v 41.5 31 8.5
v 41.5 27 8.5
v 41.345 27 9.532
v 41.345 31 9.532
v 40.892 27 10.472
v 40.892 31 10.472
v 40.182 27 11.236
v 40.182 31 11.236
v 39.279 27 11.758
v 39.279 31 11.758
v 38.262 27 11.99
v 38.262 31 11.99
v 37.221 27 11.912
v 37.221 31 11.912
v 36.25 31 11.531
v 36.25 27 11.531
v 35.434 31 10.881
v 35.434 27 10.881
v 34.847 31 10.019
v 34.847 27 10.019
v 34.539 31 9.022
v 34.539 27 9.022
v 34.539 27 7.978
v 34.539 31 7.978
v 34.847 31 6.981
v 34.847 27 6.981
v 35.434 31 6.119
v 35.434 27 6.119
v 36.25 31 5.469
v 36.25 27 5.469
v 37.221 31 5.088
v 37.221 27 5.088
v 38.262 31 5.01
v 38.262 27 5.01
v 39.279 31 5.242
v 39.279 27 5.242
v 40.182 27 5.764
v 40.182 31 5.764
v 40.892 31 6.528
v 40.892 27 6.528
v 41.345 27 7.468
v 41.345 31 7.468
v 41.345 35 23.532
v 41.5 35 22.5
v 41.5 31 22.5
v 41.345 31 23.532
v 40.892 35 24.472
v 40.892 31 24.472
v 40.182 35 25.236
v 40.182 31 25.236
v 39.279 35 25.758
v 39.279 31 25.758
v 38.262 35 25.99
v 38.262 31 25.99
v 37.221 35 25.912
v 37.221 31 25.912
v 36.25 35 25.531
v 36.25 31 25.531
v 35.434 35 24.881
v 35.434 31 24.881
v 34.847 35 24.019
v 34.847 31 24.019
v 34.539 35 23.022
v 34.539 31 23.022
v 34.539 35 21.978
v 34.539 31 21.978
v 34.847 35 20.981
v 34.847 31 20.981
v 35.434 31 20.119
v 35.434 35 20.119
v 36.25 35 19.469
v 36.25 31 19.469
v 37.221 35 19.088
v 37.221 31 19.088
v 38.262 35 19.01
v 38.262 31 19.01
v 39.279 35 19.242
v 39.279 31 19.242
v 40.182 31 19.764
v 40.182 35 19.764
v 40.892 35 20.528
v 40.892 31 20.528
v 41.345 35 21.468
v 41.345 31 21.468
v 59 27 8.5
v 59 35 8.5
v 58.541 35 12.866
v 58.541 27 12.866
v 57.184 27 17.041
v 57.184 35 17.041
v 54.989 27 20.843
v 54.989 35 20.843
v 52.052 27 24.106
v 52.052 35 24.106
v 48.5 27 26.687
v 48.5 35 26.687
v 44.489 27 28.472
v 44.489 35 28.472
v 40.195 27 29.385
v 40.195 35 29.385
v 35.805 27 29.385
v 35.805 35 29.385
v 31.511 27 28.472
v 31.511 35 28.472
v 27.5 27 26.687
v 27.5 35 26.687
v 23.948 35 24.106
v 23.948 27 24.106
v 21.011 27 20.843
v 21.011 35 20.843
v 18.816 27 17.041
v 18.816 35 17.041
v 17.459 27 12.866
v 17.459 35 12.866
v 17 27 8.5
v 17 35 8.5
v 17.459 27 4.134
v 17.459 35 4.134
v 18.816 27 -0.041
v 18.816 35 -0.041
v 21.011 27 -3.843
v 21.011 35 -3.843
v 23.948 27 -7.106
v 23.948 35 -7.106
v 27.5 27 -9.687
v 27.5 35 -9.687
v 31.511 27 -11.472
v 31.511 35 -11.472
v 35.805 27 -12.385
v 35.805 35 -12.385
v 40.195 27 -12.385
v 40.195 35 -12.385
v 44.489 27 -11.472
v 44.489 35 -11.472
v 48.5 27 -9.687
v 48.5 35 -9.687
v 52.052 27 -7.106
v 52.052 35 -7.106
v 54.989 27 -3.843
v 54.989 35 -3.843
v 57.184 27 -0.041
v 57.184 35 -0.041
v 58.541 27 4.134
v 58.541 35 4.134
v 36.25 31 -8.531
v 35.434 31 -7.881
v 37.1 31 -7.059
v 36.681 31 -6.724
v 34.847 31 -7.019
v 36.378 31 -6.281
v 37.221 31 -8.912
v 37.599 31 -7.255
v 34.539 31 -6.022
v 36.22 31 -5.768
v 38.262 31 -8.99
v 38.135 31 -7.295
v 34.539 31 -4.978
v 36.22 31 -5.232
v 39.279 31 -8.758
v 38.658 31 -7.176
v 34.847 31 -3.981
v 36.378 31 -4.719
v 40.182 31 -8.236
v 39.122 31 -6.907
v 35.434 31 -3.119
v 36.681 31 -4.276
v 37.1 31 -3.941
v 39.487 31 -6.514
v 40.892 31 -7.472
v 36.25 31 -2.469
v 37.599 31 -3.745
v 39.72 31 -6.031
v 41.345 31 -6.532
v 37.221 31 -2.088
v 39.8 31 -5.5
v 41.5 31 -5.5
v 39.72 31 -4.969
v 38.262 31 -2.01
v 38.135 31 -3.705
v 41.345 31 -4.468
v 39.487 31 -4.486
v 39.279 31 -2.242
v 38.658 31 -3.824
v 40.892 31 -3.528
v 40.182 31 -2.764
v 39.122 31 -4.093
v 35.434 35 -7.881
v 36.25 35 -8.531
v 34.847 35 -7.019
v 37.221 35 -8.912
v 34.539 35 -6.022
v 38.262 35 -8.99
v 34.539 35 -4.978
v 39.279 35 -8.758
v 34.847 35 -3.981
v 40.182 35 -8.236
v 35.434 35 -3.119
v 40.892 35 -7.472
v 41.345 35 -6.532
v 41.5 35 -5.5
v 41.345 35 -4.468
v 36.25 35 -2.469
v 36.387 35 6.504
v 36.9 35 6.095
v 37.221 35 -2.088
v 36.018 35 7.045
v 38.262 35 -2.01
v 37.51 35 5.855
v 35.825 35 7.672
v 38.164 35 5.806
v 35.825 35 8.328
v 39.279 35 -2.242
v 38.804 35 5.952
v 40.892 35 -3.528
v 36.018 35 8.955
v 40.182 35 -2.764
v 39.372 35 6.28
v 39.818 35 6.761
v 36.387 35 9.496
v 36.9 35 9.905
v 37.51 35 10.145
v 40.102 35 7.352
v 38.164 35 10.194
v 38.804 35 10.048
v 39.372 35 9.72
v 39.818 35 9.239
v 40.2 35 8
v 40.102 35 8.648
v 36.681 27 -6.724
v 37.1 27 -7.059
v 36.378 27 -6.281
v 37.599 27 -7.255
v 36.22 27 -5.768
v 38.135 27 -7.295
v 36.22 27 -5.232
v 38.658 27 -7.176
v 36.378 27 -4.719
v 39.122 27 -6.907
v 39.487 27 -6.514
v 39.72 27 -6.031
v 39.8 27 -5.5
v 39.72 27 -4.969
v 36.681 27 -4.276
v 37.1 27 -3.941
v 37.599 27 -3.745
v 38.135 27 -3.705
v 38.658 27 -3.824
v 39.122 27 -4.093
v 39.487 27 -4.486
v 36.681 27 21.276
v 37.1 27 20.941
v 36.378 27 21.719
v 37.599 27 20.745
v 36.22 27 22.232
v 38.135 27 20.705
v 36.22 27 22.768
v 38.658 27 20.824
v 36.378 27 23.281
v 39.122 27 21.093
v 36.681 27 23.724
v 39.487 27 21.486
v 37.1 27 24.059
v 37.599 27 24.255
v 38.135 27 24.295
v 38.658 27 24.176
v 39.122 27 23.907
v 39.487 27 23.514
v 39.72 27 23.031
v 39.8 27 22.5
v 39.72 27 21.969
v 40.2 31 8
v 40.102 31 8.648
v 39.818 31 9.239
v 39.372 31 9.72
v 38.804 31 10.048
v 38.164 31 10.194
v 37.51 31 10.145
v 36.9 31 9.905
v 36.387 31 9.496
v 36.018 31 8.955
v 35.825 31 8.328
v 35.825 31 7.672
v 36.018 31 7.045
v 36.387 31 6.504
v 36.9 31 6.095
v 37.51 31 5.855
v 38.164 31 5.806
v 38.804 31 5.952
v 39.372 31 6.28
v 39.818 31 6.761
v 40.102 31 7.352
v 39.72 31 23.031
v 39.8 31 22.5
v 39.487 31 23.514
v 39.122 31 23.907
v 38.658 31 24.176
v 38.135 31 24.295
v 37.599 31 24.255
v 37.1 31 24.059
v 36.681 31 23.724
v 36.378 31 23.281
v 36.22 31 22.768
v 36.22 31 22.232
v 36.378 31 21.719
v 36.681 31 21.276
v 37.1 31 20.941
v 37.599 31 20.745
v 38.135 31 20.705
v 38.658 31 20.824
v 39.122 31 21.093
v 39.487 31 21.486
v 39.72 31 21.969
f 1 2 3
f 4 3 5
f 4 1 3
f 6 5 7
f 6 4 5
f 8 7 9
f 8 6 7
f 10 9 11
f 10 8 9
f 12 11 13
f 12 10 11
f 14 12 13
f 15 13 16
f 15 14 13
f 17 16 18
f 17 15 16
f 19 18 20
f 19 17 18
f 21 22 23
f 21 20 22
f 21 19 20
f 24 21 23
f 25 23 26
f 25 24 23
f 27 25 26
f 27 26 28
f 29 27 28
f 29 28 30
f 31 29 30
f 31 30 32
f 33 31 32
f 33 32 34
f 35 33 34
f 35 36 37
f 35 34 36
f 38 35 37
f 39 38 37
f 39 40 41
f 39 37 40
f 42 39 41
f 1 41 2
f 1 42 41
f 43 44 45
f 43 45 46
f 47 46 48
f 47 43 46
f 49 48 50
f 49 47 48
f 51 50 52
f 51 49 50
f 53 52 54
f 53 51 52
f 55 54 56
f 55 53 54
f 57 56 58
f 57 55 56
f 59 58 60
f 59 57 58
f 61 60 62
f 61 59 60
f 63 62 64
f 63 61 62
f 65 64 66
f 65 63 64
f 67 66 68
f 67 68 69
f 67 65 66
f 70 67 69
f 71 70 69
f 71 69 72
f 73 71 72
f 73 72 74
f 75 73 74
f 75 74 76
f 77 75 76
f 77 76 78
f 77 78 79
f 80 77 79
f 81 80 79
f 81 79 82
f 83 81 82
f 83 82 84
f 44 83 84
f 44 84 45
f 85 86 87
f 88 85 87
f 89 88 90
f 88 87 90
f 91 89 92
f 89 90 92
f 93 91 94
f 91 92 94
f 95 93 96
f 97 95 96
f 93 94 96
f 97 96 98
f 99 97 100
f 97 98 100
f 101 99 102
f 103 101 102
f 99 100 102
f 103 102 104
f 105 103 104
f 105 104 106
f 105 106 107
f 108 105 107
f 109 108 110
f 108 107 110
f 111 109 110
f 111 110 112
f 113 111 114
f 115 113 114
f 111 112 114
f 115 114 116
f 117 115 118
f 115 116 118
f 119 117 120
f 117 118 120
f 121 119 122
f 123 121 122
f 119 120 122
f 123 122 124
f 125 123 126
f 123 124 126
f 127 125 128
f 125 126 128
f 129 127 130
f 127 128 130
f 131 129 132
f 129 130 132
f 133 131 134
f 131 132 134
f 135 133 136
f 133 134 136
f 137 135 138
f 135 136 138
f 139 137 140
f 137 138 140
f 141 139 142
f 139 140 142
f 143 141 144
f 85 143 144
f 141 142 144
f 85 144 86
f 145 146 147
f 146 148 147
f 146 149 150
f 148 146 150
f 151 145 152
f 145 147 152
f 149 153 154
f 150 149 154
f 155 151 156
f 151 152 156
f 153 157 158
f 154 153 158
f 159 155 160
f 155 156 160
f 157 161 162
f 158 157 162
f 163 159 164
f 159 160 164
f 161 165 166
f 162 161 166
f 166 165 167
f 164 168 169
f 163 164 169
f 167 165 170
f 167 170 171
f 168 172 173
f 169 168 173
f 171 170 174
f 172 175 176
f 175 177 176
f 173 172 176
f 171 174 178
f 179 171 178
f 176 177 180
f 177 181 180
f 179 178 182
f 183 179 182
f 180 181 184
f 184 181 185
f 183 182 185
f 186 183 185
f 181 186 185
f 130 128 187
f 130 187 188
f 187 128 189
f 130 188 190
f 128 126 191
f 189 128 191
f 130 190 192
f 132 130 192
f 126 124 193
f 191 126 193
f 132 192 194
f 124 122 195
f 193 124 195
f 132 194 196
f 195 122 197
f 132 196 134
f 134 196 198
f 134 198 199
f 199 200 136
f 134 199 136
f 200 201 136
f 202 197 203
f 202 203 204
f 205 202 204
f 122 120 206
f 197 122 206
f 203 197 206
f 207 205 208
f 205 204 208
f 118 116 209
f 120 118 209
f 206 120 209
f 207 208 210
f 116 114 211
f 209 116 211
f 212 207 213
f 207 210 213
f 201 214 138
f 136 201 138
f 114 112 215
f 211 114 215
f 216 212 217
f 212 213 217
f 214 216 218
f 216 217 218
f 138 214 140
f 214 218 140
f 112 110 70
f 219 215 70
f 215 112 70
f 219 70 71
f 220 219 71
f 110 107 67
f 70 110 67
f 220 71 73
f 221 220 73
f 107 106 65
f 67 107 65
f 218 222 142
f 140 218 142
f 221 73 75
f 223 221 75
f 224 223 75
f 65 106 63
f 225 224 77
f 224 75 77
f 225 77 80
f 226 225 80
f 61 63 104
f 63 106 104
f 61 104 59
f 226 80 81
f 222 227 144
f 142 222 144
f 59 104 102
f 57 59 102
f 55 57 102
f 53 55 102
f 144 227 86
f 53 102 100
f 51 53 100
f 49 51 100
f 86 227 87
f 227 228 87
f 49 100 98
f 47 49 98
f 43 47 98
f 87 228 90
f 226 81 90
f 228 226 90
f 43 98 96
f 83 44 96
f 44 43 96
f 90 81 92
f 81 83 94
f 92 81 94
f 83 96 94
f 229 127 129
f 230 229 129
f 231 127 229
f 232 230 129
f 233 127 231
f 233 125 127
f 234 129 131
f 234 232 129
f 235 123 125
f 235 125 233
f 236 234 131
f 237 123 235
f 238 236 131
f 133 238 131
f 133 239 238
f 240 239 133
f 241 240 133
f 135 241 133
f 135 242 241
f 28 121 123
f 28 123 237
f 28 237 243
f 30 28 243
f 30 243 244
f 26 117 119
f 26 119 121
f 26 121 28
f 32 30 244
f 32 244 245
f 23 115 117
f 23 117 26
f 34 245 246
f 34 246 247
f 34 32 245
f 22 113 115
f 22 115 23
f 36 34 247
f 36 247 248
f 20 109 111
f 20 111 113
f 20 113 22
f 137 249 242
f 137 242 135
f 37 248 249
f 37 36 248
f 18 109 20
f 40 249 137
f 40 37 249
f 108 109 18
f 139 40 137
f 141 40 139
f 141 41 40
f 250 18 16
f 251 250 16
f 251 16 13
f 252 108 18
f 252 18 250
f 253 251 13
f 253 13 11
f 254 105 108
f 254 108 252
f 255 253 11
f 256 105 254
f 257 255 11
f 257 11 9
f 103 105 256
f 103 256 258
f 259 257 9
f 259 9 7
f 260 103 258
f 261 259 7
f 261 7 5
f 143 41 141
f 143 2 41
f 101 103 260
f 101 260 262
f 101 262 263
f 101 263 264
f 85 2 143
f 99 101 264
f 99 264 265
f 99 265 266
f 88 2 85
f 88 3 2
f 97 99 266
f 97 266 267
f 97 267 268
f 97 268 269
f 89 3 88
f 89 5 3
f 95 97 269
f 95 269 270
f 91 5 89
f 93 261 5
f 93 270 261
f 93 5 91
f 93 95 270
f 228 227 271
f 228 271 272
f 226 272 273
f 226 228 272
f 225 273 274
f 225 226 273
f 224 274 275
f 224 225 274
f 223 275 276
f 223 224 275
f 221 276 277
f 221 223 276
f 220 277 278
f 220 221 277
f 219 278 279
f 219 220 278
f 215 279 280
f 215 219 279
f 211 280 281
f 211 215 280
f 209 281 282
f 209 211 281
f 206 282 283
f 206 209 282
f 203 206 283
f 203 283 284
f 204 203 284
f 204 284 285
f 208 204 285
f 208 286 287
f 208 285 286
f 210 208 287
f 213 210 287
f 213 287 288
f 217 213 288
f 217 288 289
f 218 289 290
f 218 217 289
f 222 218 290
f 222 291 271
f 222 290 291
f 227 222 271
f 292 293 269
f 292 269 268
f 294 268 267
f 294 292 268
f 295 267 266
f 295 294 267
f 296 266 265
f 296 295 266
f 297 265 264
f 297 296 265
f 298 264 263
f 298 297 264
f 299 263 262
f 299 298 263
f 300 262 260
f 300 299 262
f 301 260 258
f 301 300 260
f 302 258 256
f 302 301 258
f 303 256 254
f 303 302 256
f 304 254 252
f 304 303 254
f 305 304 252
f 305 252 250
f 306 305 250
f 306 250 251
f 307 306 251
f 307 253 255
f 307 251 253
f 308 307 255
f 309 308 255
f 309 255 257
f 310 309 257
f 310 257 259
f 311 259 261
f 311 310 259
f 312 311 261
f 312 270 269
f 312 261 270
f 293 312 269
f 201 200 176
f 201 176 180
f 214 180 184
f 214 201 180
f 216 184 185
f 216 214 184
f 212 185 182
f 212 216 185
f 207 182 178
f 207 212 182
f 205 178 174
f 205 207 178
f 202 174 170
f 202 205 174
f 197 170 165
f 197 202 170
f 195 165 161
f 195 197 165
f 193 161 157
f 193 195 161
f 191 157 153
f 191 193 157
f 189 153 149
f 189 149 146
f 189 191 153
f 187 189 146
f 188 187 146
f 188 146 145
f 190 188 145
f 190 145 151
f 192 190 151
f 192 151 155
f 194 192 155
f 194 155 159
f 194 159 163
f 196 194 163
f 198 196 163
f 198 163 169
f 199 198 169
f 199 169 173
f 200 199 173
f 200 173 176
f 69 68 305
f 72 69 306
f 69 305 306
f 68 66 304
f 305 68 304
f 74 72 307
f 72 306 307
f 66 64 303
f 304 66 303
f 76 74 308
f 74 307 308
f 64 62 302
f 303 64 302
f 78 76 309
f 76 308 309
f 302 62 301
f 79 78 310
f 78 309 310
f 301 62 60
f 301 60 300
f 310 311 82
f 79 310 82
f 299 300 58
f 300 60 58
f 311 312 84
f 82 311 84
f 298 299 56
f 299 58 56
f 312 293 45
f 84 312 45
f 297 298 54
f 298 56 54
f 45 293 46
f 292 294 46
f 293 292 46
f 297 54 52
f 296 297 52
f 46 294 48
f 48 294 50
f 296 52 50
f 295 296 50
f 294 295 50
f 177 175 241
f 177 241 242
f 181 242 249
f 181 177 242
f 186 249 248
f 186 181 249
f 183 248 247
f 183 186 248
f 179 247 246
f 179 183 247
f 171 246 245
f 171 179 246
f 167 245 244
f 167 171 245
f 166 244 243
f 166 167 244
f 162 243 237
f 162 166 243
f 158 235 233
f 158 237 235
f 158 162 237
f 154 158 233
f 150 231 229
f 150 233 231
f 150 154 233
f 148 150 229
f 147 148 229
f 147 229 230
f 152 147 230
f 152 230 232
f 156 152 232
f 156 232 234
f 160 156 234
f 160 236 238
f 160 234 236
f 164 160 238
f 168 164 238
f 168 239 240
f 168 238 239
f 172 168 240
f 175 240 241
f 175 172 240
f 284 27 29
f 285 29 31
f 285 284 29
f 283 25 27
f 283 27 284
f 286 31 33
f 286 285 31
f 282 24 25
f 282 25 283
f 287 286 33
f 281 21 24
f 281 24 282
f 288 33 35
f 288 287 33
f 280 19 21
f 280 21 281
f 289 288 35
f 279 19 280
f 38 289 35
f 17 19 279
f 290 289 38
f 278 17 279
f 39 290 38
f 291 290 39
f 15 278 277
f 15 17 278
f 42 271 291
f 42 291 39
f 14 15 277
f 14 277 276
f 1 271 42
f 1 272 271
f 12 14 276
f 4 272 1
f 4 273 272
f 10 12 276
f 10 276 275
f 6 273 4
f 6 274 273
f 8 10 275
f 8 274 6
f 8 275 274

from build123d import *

# Parameters (mm, degrees)
CYLINDER060_R          = 3.5
CYLINDER060_DEPTH      = 10
CYLINDER060_ROLL_ANGLE = 90
CYLINDER059_R          = 1.8
CYLINDER059_DEPTH      = 48
CYLINDER059_ROLL_ANGLE = 90
CYLINDER058_R          = 3.5
CYLINDER058_DEPTH      = 10
CYLINDER058_ROLL_ANGLE = 90
CYLINDER057_R          = 3.5
CYLINDER057_DEPTH      = 10
CYLINDER057_ROLL_ANGLE = 90
CYLINDER051_R          = 1.8
CYLINDER051_DEPTH      = 100
CYLINDER051_ROLL_ANGLE = 90
CYLINDER056_R          = 2.2
CYLINDER056_DEPTH      = 100
CYLINDER056_ROLL_ANGLE = 90
CYLINDER053_R          = 21
CYLINDER053_DEPTH      = 8
CYLINDER053_ROLL_ANGLE = 90


with BuildPart() as cilindro060:
    # Cylinder060 → Cylinder060 (new body)
    with BuildSketch(Plane.XY):
        Circle(CYLINDER060_R)
    extrude(amount=CYLINDER060_DEPTH)


with BuildPart() as cilindro060_1:
    # Cylinder060 roll: moved
    add(cilindro060.part.rotate(Axis((0, 0, 0), (1, 0, 0)), CYLINDER060_ROLL_ANGLE))


with BuildPart() as cilindro060_2:
    # Cylinder060 placement: moved
    add(cilindro060_1.part.moved(Location((38, 41, -5.5))))


with BuildPart() as cilindro059:
    # Cylinder059 → Cylinder059 (new body)
    with BuildSketch(Plane.XY):
        Circle(CYLINDER059_R)
    extrude(amount=CYLINDER059_DEPTH)


with BuildPart() as cilindro059_1:
    # Cylinder059 roll: moved
    add(cilindro059.part.rotate(Axis((0, 0, 0), (1, 0, 0)), CYLINDER059_ROLL_ANGLE))


with BuildPart() as cilindro059_2:
    # Cylinder059 placement: moved
    add(cilindro059_1.part.moved(Location((38, 41, -5.5))))


with BuildPart() as cilindro058:
    # Cylinder058 → Cylinder058 (new body)
    with BuildSketch(Plane.XY):
        Circle(CYLINDER058_R)
    extrude(amount=CYLINDER058_DEPTH)


with BuildPart() as cilindro058_1:
    # Cylinder058 roll: moved
    add(cilindro058.part.rotate(Axis((0, 0, 0), (1, 0, 0)), CYLINDER058_ROLL_ANGLE))


with BuildPart() as cilindro058_2:
    # Cylinder058 placement: moved
    add(cilindro058_1.part.moved(Location((38, 41, 22.5))))


with BuildPart() as cilindro057:
    # Cylinder057 → Cylinder057 (new body)
    with BuildSketch(Plane.XY):
        Circle(CYLINDER057_R)
    extrude(amount=CYLINDER057_DEPTH)


with BuildPart() as cilindro057_1:
    # Cylinder057 roll: moved
    add(cilindro057.part.rotate(Axis((0, 0, 0), (1, 0, 0)), CYLINDER057_ROLL_ANGLE))


with BuildPart() as cilindro057_2:
    # Cylinder057 placement: moved
    add(cilindro057_1.part.moved(Location((38, 31, 8.5))))


with BuildPart() as cilindro051:
    # Cylinder051 → Cylinder051 (new body)
    with BuildSketch(Plane.XY):
        Circle(CYLINDER051_R)
    extrude(amount=CYLINDER051_DEPTH)


with BuildPart() as cilindro051_1:
    # Cylinder051 roll: moved
    add(cilindro051.part.rotate(Axis((0, 0, 0), (1, 0, 0)), CYLINDER051_ROLL_ANGLE))


with BuildPart() as cilindro051_2:
    # Cylinder051 placement: moved
    add(cilindro051_1.part.moved(Location((38, 80, 22.5))))


with BuildPart() as cilindro056:
    # Cylinder056 → Cylinder056 (new body)
    with BuildSketch(Plane.XY):
        Circle(CYLINDER056_R)
    extrude(amount=CYLINDER056_DEPTH)


with BuildPart() as cilindro056_1:
    # Cylinder056 roll: moved
    add(cilindro056.part.rotate(Axis((0, 0, 0), (1, 0, 0)), CYLINDER056_ROLL_ANGLE))


with BuildPart() as cilindro056_2:
    # Cylinder056 placement: moved
    add(cilindro056_1.part.moved(Location((38, 94, 8))))


with BuildPart() as cut045:
    # Cylinder053 → Cylinder053 (new body)
    with BuildSketch(Plane.XY):
        Circle(CYLINDER053_R)
    extrude(amount=CYLINDER053_DEPTH)


with BuildPart() as cut045_1:
    # Cylinder053 roll: moved
    add(cut045.part.rotate(Axis((0, 0, 0), (1, 0, 0)), CYLINDER053_ROLL_ANGLE))


with BuildPart() as cut045_2:
    # Cylinder053 placement: moved
    add(cut045_1.part.moved(Location((38, 35, 8.5))))

    # Cut040: cut Cilindro056
    add(cilindro056_2.part, mode=Mode.SUBTRACT)

    # Cut041: cut Cilindro051
    add(cilindro051_2.part, mode=Mode.SUBTRACT)

    # Cut042: cut Cilindro057
    add(cilindro057_2.part, mode=Mode.SUBTRACT)

    # Cut043: cut Cilindro058
    add(cilindro058_2.part, mode=Mode.SUBTRACT)

    # Cut044: cut Cilindro059
    add(cilindro059_2.part, mode=Mode.SUBTRACT)

    # Cut045: cut Cilindro060
    add(cilindro060_2.part, mode=Mode.SUBTRACT)


solid = cut045_2.part
